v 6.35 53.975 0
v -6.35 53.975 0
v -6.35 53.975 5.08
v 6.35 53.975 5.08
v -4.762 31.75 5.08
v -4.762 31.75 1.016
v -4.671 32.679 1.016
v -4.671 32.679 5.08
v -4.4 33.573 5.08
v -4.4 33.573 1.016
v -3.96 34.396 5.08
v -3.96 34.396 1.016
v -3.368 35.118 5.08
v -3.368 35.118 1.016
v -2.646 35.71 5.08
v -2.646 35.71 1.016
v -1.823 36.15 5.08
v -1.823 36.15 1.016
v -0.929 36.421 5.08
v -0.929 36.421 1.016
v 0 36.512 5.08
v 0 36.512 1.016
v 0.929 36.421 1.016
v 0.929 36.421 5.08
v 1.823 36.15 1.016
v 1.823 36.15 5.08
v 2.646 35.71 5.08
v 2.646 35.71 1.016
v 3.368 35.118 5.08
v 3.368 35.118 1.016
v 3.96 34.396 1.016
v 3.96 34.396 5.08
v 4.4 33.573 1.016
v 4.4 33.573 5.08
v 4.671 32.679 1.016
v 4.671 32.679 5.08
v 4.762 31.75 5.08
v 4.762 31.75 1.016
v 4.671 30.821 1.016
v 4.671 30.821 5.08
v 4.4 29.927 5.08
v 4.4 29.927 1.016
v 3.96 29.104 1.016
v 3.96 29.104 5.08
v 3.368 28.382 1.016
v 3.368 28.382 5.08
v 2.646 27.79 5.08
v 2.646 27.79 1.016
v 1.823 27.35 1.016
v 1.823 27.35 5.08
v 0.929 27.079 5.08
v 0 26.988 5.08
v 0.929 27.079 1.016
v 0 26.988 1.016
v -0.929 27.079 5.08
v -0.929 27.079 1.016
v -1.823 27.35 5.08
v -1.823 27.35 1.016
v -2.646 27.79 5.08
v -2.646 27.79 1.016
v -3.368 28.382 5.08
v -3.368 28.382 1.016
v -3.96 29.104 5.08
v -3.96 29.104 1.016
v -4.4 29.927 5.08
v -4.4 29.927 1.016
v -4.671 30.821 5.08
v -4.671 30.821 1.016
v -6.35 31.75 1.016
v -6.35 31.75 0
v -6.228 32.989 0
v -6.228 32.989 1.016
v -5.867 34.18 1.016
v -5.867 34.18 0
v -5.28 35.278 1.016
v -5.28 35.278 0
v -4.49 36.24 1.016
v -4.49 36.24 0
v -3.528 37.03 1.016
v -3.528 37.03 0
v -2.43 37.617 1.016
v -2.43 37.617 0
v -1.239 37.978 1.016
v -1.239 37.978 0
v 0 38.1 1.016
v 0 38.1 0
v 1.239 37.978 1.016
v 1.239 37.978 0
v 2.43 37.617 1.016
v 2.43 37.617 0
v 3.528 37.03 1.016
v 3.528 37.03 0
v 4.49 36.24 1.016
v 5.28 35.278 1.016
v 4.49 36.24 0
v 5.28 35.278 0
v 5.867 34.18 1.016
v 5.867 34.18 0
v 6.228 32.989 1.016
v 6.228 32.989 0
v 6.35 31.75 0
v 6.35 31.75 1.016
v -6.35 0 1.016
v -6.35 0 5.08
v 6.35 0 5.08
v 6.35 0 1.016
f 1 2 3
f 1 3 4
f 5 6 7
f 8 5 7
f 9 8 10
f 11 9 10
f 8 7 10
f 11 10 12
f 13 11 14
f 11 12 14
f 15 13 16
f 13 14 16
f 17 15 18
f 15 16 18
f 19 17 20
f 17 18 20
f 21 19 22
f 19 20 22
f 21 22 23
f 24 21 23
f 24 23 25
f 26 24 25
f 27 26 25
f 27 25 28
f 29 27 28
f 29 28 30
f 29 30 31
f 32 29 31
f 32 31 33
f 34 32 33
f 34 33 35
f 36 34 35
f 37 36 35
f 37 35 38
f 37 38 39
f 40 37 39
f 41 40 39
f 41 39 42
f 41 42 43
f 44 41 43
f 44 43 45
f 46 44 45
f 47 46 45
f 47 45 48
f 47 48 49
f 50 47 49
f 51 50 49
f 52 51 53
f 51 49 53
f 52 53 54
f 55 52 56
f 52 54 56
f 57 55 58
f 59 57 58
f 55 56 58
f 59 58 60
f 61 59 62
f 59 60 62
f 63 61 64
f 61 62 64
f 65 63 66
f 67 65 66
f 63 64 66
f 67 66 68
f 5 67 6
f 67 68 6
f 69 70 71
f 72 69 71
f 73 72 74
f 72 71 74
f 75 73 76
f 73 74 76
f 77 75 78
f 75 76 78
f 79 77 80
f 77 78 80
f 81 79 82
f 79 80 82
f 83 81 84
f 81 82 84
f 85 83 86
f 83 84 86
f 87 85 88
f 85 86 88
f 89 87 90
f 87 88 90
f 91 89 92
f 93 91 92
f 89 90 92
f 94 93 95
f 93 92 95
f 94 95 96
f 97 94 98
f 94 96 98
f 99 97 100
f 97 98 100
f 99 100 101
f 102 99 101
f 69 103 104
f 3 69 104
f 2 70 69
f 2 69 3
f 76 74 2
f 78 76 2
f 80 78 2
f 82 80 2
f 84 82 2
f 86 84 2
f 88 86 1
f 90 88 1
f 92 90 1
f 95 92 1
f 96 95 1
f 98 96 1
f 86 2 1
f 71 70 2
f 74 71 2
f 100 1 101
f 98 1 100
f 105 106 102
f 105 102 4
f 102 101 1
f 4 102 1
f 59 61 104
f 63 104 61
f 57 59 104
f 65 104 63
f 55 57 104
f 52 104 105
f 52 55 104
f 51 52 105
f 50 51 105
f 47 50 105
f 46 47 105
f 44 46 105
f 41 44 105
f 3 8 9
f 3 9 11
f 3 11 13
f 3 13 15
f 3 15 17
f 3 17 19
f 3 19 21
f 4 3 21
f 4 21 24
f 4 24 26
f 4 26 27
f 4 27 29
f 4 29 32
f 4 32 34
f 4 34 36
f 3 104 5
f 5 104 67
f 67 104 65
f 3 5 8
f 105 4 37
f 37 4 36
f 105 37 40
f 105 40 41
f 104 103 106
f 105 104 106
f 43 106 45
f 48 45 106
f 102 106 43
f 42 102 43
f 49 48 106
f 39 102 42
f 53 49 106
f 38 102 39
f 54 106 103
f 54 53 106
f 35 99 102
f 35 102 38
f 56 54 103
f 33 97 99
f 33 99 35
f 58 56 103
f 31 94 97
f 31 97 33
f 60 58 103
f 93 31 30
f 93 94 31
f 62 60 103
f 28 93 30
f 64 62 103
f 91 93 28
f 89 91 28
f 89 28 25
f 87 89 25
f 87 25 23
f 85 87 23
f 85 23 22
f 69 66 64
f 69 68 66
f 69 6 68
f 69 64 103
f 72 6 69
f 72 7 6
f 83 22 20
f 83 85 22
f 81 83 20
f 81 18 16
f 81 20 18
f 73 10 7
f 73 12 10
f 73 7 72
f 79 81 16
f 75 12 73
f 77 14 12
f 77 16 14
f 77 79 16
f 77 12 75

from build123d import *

# Parameters (mm, degrees)
SKETCH1_W           = 12.7
SKETCH1_H           = 53.975
BOSS_EXTRUDE1_DEPTH = 5.08
CUT_EXTRUDE1_DEPTH  = 1.016
SKETCH3_R           = 4.7625
CUT_EXTRUDE2_DEPTH  = 55.498983669


with BuildPart() as part:
    # Sketch1 → Boss-Extrude1 (new body)
    with BuildSketch(Plane.XY):
        with Locations((0, 26.9875)):
            Rectangle(SKETCH1_W, SKETCH1_H)
    extrude(amount=BOSS_EXTRUDE1_DEPTH)

    # Sketch2 → Cut-Extrude1 (cut)
    with BuildSketch(Plane.XY):
        with BuildLine():
            Line((-6.35, -31.75), (-6.35, 31.75))
            ThreePointArc((-6.35, 31.75), (0, 38.1), (6.35, 31.75))
            Line((6.35, 31.75), (6.35, -31.75))
            ThreePointArc((6.35, -31.75), (0, -38.1), (-6.35, -31.75))
        make_face()
    extrude(amount=CUT_EXTRUDE1_DEPTH, mode=Mode.SUBTRACT)

    # Sketch3 → Cut-Extrude2 (cut, through all)
    with BuildSketch(Plane(origin=(0, 0, 1.016), x_dir=(-1, 0, 0), z_dir=(0, 0, -1))):
        with Locations((0, 31.75)):
            Circle(SKETCH3_R)
    extrude(amount=-CUT_EXTRUDE2_DEPTH, mode=Mode.SUBTRACT)


solid = part.part
